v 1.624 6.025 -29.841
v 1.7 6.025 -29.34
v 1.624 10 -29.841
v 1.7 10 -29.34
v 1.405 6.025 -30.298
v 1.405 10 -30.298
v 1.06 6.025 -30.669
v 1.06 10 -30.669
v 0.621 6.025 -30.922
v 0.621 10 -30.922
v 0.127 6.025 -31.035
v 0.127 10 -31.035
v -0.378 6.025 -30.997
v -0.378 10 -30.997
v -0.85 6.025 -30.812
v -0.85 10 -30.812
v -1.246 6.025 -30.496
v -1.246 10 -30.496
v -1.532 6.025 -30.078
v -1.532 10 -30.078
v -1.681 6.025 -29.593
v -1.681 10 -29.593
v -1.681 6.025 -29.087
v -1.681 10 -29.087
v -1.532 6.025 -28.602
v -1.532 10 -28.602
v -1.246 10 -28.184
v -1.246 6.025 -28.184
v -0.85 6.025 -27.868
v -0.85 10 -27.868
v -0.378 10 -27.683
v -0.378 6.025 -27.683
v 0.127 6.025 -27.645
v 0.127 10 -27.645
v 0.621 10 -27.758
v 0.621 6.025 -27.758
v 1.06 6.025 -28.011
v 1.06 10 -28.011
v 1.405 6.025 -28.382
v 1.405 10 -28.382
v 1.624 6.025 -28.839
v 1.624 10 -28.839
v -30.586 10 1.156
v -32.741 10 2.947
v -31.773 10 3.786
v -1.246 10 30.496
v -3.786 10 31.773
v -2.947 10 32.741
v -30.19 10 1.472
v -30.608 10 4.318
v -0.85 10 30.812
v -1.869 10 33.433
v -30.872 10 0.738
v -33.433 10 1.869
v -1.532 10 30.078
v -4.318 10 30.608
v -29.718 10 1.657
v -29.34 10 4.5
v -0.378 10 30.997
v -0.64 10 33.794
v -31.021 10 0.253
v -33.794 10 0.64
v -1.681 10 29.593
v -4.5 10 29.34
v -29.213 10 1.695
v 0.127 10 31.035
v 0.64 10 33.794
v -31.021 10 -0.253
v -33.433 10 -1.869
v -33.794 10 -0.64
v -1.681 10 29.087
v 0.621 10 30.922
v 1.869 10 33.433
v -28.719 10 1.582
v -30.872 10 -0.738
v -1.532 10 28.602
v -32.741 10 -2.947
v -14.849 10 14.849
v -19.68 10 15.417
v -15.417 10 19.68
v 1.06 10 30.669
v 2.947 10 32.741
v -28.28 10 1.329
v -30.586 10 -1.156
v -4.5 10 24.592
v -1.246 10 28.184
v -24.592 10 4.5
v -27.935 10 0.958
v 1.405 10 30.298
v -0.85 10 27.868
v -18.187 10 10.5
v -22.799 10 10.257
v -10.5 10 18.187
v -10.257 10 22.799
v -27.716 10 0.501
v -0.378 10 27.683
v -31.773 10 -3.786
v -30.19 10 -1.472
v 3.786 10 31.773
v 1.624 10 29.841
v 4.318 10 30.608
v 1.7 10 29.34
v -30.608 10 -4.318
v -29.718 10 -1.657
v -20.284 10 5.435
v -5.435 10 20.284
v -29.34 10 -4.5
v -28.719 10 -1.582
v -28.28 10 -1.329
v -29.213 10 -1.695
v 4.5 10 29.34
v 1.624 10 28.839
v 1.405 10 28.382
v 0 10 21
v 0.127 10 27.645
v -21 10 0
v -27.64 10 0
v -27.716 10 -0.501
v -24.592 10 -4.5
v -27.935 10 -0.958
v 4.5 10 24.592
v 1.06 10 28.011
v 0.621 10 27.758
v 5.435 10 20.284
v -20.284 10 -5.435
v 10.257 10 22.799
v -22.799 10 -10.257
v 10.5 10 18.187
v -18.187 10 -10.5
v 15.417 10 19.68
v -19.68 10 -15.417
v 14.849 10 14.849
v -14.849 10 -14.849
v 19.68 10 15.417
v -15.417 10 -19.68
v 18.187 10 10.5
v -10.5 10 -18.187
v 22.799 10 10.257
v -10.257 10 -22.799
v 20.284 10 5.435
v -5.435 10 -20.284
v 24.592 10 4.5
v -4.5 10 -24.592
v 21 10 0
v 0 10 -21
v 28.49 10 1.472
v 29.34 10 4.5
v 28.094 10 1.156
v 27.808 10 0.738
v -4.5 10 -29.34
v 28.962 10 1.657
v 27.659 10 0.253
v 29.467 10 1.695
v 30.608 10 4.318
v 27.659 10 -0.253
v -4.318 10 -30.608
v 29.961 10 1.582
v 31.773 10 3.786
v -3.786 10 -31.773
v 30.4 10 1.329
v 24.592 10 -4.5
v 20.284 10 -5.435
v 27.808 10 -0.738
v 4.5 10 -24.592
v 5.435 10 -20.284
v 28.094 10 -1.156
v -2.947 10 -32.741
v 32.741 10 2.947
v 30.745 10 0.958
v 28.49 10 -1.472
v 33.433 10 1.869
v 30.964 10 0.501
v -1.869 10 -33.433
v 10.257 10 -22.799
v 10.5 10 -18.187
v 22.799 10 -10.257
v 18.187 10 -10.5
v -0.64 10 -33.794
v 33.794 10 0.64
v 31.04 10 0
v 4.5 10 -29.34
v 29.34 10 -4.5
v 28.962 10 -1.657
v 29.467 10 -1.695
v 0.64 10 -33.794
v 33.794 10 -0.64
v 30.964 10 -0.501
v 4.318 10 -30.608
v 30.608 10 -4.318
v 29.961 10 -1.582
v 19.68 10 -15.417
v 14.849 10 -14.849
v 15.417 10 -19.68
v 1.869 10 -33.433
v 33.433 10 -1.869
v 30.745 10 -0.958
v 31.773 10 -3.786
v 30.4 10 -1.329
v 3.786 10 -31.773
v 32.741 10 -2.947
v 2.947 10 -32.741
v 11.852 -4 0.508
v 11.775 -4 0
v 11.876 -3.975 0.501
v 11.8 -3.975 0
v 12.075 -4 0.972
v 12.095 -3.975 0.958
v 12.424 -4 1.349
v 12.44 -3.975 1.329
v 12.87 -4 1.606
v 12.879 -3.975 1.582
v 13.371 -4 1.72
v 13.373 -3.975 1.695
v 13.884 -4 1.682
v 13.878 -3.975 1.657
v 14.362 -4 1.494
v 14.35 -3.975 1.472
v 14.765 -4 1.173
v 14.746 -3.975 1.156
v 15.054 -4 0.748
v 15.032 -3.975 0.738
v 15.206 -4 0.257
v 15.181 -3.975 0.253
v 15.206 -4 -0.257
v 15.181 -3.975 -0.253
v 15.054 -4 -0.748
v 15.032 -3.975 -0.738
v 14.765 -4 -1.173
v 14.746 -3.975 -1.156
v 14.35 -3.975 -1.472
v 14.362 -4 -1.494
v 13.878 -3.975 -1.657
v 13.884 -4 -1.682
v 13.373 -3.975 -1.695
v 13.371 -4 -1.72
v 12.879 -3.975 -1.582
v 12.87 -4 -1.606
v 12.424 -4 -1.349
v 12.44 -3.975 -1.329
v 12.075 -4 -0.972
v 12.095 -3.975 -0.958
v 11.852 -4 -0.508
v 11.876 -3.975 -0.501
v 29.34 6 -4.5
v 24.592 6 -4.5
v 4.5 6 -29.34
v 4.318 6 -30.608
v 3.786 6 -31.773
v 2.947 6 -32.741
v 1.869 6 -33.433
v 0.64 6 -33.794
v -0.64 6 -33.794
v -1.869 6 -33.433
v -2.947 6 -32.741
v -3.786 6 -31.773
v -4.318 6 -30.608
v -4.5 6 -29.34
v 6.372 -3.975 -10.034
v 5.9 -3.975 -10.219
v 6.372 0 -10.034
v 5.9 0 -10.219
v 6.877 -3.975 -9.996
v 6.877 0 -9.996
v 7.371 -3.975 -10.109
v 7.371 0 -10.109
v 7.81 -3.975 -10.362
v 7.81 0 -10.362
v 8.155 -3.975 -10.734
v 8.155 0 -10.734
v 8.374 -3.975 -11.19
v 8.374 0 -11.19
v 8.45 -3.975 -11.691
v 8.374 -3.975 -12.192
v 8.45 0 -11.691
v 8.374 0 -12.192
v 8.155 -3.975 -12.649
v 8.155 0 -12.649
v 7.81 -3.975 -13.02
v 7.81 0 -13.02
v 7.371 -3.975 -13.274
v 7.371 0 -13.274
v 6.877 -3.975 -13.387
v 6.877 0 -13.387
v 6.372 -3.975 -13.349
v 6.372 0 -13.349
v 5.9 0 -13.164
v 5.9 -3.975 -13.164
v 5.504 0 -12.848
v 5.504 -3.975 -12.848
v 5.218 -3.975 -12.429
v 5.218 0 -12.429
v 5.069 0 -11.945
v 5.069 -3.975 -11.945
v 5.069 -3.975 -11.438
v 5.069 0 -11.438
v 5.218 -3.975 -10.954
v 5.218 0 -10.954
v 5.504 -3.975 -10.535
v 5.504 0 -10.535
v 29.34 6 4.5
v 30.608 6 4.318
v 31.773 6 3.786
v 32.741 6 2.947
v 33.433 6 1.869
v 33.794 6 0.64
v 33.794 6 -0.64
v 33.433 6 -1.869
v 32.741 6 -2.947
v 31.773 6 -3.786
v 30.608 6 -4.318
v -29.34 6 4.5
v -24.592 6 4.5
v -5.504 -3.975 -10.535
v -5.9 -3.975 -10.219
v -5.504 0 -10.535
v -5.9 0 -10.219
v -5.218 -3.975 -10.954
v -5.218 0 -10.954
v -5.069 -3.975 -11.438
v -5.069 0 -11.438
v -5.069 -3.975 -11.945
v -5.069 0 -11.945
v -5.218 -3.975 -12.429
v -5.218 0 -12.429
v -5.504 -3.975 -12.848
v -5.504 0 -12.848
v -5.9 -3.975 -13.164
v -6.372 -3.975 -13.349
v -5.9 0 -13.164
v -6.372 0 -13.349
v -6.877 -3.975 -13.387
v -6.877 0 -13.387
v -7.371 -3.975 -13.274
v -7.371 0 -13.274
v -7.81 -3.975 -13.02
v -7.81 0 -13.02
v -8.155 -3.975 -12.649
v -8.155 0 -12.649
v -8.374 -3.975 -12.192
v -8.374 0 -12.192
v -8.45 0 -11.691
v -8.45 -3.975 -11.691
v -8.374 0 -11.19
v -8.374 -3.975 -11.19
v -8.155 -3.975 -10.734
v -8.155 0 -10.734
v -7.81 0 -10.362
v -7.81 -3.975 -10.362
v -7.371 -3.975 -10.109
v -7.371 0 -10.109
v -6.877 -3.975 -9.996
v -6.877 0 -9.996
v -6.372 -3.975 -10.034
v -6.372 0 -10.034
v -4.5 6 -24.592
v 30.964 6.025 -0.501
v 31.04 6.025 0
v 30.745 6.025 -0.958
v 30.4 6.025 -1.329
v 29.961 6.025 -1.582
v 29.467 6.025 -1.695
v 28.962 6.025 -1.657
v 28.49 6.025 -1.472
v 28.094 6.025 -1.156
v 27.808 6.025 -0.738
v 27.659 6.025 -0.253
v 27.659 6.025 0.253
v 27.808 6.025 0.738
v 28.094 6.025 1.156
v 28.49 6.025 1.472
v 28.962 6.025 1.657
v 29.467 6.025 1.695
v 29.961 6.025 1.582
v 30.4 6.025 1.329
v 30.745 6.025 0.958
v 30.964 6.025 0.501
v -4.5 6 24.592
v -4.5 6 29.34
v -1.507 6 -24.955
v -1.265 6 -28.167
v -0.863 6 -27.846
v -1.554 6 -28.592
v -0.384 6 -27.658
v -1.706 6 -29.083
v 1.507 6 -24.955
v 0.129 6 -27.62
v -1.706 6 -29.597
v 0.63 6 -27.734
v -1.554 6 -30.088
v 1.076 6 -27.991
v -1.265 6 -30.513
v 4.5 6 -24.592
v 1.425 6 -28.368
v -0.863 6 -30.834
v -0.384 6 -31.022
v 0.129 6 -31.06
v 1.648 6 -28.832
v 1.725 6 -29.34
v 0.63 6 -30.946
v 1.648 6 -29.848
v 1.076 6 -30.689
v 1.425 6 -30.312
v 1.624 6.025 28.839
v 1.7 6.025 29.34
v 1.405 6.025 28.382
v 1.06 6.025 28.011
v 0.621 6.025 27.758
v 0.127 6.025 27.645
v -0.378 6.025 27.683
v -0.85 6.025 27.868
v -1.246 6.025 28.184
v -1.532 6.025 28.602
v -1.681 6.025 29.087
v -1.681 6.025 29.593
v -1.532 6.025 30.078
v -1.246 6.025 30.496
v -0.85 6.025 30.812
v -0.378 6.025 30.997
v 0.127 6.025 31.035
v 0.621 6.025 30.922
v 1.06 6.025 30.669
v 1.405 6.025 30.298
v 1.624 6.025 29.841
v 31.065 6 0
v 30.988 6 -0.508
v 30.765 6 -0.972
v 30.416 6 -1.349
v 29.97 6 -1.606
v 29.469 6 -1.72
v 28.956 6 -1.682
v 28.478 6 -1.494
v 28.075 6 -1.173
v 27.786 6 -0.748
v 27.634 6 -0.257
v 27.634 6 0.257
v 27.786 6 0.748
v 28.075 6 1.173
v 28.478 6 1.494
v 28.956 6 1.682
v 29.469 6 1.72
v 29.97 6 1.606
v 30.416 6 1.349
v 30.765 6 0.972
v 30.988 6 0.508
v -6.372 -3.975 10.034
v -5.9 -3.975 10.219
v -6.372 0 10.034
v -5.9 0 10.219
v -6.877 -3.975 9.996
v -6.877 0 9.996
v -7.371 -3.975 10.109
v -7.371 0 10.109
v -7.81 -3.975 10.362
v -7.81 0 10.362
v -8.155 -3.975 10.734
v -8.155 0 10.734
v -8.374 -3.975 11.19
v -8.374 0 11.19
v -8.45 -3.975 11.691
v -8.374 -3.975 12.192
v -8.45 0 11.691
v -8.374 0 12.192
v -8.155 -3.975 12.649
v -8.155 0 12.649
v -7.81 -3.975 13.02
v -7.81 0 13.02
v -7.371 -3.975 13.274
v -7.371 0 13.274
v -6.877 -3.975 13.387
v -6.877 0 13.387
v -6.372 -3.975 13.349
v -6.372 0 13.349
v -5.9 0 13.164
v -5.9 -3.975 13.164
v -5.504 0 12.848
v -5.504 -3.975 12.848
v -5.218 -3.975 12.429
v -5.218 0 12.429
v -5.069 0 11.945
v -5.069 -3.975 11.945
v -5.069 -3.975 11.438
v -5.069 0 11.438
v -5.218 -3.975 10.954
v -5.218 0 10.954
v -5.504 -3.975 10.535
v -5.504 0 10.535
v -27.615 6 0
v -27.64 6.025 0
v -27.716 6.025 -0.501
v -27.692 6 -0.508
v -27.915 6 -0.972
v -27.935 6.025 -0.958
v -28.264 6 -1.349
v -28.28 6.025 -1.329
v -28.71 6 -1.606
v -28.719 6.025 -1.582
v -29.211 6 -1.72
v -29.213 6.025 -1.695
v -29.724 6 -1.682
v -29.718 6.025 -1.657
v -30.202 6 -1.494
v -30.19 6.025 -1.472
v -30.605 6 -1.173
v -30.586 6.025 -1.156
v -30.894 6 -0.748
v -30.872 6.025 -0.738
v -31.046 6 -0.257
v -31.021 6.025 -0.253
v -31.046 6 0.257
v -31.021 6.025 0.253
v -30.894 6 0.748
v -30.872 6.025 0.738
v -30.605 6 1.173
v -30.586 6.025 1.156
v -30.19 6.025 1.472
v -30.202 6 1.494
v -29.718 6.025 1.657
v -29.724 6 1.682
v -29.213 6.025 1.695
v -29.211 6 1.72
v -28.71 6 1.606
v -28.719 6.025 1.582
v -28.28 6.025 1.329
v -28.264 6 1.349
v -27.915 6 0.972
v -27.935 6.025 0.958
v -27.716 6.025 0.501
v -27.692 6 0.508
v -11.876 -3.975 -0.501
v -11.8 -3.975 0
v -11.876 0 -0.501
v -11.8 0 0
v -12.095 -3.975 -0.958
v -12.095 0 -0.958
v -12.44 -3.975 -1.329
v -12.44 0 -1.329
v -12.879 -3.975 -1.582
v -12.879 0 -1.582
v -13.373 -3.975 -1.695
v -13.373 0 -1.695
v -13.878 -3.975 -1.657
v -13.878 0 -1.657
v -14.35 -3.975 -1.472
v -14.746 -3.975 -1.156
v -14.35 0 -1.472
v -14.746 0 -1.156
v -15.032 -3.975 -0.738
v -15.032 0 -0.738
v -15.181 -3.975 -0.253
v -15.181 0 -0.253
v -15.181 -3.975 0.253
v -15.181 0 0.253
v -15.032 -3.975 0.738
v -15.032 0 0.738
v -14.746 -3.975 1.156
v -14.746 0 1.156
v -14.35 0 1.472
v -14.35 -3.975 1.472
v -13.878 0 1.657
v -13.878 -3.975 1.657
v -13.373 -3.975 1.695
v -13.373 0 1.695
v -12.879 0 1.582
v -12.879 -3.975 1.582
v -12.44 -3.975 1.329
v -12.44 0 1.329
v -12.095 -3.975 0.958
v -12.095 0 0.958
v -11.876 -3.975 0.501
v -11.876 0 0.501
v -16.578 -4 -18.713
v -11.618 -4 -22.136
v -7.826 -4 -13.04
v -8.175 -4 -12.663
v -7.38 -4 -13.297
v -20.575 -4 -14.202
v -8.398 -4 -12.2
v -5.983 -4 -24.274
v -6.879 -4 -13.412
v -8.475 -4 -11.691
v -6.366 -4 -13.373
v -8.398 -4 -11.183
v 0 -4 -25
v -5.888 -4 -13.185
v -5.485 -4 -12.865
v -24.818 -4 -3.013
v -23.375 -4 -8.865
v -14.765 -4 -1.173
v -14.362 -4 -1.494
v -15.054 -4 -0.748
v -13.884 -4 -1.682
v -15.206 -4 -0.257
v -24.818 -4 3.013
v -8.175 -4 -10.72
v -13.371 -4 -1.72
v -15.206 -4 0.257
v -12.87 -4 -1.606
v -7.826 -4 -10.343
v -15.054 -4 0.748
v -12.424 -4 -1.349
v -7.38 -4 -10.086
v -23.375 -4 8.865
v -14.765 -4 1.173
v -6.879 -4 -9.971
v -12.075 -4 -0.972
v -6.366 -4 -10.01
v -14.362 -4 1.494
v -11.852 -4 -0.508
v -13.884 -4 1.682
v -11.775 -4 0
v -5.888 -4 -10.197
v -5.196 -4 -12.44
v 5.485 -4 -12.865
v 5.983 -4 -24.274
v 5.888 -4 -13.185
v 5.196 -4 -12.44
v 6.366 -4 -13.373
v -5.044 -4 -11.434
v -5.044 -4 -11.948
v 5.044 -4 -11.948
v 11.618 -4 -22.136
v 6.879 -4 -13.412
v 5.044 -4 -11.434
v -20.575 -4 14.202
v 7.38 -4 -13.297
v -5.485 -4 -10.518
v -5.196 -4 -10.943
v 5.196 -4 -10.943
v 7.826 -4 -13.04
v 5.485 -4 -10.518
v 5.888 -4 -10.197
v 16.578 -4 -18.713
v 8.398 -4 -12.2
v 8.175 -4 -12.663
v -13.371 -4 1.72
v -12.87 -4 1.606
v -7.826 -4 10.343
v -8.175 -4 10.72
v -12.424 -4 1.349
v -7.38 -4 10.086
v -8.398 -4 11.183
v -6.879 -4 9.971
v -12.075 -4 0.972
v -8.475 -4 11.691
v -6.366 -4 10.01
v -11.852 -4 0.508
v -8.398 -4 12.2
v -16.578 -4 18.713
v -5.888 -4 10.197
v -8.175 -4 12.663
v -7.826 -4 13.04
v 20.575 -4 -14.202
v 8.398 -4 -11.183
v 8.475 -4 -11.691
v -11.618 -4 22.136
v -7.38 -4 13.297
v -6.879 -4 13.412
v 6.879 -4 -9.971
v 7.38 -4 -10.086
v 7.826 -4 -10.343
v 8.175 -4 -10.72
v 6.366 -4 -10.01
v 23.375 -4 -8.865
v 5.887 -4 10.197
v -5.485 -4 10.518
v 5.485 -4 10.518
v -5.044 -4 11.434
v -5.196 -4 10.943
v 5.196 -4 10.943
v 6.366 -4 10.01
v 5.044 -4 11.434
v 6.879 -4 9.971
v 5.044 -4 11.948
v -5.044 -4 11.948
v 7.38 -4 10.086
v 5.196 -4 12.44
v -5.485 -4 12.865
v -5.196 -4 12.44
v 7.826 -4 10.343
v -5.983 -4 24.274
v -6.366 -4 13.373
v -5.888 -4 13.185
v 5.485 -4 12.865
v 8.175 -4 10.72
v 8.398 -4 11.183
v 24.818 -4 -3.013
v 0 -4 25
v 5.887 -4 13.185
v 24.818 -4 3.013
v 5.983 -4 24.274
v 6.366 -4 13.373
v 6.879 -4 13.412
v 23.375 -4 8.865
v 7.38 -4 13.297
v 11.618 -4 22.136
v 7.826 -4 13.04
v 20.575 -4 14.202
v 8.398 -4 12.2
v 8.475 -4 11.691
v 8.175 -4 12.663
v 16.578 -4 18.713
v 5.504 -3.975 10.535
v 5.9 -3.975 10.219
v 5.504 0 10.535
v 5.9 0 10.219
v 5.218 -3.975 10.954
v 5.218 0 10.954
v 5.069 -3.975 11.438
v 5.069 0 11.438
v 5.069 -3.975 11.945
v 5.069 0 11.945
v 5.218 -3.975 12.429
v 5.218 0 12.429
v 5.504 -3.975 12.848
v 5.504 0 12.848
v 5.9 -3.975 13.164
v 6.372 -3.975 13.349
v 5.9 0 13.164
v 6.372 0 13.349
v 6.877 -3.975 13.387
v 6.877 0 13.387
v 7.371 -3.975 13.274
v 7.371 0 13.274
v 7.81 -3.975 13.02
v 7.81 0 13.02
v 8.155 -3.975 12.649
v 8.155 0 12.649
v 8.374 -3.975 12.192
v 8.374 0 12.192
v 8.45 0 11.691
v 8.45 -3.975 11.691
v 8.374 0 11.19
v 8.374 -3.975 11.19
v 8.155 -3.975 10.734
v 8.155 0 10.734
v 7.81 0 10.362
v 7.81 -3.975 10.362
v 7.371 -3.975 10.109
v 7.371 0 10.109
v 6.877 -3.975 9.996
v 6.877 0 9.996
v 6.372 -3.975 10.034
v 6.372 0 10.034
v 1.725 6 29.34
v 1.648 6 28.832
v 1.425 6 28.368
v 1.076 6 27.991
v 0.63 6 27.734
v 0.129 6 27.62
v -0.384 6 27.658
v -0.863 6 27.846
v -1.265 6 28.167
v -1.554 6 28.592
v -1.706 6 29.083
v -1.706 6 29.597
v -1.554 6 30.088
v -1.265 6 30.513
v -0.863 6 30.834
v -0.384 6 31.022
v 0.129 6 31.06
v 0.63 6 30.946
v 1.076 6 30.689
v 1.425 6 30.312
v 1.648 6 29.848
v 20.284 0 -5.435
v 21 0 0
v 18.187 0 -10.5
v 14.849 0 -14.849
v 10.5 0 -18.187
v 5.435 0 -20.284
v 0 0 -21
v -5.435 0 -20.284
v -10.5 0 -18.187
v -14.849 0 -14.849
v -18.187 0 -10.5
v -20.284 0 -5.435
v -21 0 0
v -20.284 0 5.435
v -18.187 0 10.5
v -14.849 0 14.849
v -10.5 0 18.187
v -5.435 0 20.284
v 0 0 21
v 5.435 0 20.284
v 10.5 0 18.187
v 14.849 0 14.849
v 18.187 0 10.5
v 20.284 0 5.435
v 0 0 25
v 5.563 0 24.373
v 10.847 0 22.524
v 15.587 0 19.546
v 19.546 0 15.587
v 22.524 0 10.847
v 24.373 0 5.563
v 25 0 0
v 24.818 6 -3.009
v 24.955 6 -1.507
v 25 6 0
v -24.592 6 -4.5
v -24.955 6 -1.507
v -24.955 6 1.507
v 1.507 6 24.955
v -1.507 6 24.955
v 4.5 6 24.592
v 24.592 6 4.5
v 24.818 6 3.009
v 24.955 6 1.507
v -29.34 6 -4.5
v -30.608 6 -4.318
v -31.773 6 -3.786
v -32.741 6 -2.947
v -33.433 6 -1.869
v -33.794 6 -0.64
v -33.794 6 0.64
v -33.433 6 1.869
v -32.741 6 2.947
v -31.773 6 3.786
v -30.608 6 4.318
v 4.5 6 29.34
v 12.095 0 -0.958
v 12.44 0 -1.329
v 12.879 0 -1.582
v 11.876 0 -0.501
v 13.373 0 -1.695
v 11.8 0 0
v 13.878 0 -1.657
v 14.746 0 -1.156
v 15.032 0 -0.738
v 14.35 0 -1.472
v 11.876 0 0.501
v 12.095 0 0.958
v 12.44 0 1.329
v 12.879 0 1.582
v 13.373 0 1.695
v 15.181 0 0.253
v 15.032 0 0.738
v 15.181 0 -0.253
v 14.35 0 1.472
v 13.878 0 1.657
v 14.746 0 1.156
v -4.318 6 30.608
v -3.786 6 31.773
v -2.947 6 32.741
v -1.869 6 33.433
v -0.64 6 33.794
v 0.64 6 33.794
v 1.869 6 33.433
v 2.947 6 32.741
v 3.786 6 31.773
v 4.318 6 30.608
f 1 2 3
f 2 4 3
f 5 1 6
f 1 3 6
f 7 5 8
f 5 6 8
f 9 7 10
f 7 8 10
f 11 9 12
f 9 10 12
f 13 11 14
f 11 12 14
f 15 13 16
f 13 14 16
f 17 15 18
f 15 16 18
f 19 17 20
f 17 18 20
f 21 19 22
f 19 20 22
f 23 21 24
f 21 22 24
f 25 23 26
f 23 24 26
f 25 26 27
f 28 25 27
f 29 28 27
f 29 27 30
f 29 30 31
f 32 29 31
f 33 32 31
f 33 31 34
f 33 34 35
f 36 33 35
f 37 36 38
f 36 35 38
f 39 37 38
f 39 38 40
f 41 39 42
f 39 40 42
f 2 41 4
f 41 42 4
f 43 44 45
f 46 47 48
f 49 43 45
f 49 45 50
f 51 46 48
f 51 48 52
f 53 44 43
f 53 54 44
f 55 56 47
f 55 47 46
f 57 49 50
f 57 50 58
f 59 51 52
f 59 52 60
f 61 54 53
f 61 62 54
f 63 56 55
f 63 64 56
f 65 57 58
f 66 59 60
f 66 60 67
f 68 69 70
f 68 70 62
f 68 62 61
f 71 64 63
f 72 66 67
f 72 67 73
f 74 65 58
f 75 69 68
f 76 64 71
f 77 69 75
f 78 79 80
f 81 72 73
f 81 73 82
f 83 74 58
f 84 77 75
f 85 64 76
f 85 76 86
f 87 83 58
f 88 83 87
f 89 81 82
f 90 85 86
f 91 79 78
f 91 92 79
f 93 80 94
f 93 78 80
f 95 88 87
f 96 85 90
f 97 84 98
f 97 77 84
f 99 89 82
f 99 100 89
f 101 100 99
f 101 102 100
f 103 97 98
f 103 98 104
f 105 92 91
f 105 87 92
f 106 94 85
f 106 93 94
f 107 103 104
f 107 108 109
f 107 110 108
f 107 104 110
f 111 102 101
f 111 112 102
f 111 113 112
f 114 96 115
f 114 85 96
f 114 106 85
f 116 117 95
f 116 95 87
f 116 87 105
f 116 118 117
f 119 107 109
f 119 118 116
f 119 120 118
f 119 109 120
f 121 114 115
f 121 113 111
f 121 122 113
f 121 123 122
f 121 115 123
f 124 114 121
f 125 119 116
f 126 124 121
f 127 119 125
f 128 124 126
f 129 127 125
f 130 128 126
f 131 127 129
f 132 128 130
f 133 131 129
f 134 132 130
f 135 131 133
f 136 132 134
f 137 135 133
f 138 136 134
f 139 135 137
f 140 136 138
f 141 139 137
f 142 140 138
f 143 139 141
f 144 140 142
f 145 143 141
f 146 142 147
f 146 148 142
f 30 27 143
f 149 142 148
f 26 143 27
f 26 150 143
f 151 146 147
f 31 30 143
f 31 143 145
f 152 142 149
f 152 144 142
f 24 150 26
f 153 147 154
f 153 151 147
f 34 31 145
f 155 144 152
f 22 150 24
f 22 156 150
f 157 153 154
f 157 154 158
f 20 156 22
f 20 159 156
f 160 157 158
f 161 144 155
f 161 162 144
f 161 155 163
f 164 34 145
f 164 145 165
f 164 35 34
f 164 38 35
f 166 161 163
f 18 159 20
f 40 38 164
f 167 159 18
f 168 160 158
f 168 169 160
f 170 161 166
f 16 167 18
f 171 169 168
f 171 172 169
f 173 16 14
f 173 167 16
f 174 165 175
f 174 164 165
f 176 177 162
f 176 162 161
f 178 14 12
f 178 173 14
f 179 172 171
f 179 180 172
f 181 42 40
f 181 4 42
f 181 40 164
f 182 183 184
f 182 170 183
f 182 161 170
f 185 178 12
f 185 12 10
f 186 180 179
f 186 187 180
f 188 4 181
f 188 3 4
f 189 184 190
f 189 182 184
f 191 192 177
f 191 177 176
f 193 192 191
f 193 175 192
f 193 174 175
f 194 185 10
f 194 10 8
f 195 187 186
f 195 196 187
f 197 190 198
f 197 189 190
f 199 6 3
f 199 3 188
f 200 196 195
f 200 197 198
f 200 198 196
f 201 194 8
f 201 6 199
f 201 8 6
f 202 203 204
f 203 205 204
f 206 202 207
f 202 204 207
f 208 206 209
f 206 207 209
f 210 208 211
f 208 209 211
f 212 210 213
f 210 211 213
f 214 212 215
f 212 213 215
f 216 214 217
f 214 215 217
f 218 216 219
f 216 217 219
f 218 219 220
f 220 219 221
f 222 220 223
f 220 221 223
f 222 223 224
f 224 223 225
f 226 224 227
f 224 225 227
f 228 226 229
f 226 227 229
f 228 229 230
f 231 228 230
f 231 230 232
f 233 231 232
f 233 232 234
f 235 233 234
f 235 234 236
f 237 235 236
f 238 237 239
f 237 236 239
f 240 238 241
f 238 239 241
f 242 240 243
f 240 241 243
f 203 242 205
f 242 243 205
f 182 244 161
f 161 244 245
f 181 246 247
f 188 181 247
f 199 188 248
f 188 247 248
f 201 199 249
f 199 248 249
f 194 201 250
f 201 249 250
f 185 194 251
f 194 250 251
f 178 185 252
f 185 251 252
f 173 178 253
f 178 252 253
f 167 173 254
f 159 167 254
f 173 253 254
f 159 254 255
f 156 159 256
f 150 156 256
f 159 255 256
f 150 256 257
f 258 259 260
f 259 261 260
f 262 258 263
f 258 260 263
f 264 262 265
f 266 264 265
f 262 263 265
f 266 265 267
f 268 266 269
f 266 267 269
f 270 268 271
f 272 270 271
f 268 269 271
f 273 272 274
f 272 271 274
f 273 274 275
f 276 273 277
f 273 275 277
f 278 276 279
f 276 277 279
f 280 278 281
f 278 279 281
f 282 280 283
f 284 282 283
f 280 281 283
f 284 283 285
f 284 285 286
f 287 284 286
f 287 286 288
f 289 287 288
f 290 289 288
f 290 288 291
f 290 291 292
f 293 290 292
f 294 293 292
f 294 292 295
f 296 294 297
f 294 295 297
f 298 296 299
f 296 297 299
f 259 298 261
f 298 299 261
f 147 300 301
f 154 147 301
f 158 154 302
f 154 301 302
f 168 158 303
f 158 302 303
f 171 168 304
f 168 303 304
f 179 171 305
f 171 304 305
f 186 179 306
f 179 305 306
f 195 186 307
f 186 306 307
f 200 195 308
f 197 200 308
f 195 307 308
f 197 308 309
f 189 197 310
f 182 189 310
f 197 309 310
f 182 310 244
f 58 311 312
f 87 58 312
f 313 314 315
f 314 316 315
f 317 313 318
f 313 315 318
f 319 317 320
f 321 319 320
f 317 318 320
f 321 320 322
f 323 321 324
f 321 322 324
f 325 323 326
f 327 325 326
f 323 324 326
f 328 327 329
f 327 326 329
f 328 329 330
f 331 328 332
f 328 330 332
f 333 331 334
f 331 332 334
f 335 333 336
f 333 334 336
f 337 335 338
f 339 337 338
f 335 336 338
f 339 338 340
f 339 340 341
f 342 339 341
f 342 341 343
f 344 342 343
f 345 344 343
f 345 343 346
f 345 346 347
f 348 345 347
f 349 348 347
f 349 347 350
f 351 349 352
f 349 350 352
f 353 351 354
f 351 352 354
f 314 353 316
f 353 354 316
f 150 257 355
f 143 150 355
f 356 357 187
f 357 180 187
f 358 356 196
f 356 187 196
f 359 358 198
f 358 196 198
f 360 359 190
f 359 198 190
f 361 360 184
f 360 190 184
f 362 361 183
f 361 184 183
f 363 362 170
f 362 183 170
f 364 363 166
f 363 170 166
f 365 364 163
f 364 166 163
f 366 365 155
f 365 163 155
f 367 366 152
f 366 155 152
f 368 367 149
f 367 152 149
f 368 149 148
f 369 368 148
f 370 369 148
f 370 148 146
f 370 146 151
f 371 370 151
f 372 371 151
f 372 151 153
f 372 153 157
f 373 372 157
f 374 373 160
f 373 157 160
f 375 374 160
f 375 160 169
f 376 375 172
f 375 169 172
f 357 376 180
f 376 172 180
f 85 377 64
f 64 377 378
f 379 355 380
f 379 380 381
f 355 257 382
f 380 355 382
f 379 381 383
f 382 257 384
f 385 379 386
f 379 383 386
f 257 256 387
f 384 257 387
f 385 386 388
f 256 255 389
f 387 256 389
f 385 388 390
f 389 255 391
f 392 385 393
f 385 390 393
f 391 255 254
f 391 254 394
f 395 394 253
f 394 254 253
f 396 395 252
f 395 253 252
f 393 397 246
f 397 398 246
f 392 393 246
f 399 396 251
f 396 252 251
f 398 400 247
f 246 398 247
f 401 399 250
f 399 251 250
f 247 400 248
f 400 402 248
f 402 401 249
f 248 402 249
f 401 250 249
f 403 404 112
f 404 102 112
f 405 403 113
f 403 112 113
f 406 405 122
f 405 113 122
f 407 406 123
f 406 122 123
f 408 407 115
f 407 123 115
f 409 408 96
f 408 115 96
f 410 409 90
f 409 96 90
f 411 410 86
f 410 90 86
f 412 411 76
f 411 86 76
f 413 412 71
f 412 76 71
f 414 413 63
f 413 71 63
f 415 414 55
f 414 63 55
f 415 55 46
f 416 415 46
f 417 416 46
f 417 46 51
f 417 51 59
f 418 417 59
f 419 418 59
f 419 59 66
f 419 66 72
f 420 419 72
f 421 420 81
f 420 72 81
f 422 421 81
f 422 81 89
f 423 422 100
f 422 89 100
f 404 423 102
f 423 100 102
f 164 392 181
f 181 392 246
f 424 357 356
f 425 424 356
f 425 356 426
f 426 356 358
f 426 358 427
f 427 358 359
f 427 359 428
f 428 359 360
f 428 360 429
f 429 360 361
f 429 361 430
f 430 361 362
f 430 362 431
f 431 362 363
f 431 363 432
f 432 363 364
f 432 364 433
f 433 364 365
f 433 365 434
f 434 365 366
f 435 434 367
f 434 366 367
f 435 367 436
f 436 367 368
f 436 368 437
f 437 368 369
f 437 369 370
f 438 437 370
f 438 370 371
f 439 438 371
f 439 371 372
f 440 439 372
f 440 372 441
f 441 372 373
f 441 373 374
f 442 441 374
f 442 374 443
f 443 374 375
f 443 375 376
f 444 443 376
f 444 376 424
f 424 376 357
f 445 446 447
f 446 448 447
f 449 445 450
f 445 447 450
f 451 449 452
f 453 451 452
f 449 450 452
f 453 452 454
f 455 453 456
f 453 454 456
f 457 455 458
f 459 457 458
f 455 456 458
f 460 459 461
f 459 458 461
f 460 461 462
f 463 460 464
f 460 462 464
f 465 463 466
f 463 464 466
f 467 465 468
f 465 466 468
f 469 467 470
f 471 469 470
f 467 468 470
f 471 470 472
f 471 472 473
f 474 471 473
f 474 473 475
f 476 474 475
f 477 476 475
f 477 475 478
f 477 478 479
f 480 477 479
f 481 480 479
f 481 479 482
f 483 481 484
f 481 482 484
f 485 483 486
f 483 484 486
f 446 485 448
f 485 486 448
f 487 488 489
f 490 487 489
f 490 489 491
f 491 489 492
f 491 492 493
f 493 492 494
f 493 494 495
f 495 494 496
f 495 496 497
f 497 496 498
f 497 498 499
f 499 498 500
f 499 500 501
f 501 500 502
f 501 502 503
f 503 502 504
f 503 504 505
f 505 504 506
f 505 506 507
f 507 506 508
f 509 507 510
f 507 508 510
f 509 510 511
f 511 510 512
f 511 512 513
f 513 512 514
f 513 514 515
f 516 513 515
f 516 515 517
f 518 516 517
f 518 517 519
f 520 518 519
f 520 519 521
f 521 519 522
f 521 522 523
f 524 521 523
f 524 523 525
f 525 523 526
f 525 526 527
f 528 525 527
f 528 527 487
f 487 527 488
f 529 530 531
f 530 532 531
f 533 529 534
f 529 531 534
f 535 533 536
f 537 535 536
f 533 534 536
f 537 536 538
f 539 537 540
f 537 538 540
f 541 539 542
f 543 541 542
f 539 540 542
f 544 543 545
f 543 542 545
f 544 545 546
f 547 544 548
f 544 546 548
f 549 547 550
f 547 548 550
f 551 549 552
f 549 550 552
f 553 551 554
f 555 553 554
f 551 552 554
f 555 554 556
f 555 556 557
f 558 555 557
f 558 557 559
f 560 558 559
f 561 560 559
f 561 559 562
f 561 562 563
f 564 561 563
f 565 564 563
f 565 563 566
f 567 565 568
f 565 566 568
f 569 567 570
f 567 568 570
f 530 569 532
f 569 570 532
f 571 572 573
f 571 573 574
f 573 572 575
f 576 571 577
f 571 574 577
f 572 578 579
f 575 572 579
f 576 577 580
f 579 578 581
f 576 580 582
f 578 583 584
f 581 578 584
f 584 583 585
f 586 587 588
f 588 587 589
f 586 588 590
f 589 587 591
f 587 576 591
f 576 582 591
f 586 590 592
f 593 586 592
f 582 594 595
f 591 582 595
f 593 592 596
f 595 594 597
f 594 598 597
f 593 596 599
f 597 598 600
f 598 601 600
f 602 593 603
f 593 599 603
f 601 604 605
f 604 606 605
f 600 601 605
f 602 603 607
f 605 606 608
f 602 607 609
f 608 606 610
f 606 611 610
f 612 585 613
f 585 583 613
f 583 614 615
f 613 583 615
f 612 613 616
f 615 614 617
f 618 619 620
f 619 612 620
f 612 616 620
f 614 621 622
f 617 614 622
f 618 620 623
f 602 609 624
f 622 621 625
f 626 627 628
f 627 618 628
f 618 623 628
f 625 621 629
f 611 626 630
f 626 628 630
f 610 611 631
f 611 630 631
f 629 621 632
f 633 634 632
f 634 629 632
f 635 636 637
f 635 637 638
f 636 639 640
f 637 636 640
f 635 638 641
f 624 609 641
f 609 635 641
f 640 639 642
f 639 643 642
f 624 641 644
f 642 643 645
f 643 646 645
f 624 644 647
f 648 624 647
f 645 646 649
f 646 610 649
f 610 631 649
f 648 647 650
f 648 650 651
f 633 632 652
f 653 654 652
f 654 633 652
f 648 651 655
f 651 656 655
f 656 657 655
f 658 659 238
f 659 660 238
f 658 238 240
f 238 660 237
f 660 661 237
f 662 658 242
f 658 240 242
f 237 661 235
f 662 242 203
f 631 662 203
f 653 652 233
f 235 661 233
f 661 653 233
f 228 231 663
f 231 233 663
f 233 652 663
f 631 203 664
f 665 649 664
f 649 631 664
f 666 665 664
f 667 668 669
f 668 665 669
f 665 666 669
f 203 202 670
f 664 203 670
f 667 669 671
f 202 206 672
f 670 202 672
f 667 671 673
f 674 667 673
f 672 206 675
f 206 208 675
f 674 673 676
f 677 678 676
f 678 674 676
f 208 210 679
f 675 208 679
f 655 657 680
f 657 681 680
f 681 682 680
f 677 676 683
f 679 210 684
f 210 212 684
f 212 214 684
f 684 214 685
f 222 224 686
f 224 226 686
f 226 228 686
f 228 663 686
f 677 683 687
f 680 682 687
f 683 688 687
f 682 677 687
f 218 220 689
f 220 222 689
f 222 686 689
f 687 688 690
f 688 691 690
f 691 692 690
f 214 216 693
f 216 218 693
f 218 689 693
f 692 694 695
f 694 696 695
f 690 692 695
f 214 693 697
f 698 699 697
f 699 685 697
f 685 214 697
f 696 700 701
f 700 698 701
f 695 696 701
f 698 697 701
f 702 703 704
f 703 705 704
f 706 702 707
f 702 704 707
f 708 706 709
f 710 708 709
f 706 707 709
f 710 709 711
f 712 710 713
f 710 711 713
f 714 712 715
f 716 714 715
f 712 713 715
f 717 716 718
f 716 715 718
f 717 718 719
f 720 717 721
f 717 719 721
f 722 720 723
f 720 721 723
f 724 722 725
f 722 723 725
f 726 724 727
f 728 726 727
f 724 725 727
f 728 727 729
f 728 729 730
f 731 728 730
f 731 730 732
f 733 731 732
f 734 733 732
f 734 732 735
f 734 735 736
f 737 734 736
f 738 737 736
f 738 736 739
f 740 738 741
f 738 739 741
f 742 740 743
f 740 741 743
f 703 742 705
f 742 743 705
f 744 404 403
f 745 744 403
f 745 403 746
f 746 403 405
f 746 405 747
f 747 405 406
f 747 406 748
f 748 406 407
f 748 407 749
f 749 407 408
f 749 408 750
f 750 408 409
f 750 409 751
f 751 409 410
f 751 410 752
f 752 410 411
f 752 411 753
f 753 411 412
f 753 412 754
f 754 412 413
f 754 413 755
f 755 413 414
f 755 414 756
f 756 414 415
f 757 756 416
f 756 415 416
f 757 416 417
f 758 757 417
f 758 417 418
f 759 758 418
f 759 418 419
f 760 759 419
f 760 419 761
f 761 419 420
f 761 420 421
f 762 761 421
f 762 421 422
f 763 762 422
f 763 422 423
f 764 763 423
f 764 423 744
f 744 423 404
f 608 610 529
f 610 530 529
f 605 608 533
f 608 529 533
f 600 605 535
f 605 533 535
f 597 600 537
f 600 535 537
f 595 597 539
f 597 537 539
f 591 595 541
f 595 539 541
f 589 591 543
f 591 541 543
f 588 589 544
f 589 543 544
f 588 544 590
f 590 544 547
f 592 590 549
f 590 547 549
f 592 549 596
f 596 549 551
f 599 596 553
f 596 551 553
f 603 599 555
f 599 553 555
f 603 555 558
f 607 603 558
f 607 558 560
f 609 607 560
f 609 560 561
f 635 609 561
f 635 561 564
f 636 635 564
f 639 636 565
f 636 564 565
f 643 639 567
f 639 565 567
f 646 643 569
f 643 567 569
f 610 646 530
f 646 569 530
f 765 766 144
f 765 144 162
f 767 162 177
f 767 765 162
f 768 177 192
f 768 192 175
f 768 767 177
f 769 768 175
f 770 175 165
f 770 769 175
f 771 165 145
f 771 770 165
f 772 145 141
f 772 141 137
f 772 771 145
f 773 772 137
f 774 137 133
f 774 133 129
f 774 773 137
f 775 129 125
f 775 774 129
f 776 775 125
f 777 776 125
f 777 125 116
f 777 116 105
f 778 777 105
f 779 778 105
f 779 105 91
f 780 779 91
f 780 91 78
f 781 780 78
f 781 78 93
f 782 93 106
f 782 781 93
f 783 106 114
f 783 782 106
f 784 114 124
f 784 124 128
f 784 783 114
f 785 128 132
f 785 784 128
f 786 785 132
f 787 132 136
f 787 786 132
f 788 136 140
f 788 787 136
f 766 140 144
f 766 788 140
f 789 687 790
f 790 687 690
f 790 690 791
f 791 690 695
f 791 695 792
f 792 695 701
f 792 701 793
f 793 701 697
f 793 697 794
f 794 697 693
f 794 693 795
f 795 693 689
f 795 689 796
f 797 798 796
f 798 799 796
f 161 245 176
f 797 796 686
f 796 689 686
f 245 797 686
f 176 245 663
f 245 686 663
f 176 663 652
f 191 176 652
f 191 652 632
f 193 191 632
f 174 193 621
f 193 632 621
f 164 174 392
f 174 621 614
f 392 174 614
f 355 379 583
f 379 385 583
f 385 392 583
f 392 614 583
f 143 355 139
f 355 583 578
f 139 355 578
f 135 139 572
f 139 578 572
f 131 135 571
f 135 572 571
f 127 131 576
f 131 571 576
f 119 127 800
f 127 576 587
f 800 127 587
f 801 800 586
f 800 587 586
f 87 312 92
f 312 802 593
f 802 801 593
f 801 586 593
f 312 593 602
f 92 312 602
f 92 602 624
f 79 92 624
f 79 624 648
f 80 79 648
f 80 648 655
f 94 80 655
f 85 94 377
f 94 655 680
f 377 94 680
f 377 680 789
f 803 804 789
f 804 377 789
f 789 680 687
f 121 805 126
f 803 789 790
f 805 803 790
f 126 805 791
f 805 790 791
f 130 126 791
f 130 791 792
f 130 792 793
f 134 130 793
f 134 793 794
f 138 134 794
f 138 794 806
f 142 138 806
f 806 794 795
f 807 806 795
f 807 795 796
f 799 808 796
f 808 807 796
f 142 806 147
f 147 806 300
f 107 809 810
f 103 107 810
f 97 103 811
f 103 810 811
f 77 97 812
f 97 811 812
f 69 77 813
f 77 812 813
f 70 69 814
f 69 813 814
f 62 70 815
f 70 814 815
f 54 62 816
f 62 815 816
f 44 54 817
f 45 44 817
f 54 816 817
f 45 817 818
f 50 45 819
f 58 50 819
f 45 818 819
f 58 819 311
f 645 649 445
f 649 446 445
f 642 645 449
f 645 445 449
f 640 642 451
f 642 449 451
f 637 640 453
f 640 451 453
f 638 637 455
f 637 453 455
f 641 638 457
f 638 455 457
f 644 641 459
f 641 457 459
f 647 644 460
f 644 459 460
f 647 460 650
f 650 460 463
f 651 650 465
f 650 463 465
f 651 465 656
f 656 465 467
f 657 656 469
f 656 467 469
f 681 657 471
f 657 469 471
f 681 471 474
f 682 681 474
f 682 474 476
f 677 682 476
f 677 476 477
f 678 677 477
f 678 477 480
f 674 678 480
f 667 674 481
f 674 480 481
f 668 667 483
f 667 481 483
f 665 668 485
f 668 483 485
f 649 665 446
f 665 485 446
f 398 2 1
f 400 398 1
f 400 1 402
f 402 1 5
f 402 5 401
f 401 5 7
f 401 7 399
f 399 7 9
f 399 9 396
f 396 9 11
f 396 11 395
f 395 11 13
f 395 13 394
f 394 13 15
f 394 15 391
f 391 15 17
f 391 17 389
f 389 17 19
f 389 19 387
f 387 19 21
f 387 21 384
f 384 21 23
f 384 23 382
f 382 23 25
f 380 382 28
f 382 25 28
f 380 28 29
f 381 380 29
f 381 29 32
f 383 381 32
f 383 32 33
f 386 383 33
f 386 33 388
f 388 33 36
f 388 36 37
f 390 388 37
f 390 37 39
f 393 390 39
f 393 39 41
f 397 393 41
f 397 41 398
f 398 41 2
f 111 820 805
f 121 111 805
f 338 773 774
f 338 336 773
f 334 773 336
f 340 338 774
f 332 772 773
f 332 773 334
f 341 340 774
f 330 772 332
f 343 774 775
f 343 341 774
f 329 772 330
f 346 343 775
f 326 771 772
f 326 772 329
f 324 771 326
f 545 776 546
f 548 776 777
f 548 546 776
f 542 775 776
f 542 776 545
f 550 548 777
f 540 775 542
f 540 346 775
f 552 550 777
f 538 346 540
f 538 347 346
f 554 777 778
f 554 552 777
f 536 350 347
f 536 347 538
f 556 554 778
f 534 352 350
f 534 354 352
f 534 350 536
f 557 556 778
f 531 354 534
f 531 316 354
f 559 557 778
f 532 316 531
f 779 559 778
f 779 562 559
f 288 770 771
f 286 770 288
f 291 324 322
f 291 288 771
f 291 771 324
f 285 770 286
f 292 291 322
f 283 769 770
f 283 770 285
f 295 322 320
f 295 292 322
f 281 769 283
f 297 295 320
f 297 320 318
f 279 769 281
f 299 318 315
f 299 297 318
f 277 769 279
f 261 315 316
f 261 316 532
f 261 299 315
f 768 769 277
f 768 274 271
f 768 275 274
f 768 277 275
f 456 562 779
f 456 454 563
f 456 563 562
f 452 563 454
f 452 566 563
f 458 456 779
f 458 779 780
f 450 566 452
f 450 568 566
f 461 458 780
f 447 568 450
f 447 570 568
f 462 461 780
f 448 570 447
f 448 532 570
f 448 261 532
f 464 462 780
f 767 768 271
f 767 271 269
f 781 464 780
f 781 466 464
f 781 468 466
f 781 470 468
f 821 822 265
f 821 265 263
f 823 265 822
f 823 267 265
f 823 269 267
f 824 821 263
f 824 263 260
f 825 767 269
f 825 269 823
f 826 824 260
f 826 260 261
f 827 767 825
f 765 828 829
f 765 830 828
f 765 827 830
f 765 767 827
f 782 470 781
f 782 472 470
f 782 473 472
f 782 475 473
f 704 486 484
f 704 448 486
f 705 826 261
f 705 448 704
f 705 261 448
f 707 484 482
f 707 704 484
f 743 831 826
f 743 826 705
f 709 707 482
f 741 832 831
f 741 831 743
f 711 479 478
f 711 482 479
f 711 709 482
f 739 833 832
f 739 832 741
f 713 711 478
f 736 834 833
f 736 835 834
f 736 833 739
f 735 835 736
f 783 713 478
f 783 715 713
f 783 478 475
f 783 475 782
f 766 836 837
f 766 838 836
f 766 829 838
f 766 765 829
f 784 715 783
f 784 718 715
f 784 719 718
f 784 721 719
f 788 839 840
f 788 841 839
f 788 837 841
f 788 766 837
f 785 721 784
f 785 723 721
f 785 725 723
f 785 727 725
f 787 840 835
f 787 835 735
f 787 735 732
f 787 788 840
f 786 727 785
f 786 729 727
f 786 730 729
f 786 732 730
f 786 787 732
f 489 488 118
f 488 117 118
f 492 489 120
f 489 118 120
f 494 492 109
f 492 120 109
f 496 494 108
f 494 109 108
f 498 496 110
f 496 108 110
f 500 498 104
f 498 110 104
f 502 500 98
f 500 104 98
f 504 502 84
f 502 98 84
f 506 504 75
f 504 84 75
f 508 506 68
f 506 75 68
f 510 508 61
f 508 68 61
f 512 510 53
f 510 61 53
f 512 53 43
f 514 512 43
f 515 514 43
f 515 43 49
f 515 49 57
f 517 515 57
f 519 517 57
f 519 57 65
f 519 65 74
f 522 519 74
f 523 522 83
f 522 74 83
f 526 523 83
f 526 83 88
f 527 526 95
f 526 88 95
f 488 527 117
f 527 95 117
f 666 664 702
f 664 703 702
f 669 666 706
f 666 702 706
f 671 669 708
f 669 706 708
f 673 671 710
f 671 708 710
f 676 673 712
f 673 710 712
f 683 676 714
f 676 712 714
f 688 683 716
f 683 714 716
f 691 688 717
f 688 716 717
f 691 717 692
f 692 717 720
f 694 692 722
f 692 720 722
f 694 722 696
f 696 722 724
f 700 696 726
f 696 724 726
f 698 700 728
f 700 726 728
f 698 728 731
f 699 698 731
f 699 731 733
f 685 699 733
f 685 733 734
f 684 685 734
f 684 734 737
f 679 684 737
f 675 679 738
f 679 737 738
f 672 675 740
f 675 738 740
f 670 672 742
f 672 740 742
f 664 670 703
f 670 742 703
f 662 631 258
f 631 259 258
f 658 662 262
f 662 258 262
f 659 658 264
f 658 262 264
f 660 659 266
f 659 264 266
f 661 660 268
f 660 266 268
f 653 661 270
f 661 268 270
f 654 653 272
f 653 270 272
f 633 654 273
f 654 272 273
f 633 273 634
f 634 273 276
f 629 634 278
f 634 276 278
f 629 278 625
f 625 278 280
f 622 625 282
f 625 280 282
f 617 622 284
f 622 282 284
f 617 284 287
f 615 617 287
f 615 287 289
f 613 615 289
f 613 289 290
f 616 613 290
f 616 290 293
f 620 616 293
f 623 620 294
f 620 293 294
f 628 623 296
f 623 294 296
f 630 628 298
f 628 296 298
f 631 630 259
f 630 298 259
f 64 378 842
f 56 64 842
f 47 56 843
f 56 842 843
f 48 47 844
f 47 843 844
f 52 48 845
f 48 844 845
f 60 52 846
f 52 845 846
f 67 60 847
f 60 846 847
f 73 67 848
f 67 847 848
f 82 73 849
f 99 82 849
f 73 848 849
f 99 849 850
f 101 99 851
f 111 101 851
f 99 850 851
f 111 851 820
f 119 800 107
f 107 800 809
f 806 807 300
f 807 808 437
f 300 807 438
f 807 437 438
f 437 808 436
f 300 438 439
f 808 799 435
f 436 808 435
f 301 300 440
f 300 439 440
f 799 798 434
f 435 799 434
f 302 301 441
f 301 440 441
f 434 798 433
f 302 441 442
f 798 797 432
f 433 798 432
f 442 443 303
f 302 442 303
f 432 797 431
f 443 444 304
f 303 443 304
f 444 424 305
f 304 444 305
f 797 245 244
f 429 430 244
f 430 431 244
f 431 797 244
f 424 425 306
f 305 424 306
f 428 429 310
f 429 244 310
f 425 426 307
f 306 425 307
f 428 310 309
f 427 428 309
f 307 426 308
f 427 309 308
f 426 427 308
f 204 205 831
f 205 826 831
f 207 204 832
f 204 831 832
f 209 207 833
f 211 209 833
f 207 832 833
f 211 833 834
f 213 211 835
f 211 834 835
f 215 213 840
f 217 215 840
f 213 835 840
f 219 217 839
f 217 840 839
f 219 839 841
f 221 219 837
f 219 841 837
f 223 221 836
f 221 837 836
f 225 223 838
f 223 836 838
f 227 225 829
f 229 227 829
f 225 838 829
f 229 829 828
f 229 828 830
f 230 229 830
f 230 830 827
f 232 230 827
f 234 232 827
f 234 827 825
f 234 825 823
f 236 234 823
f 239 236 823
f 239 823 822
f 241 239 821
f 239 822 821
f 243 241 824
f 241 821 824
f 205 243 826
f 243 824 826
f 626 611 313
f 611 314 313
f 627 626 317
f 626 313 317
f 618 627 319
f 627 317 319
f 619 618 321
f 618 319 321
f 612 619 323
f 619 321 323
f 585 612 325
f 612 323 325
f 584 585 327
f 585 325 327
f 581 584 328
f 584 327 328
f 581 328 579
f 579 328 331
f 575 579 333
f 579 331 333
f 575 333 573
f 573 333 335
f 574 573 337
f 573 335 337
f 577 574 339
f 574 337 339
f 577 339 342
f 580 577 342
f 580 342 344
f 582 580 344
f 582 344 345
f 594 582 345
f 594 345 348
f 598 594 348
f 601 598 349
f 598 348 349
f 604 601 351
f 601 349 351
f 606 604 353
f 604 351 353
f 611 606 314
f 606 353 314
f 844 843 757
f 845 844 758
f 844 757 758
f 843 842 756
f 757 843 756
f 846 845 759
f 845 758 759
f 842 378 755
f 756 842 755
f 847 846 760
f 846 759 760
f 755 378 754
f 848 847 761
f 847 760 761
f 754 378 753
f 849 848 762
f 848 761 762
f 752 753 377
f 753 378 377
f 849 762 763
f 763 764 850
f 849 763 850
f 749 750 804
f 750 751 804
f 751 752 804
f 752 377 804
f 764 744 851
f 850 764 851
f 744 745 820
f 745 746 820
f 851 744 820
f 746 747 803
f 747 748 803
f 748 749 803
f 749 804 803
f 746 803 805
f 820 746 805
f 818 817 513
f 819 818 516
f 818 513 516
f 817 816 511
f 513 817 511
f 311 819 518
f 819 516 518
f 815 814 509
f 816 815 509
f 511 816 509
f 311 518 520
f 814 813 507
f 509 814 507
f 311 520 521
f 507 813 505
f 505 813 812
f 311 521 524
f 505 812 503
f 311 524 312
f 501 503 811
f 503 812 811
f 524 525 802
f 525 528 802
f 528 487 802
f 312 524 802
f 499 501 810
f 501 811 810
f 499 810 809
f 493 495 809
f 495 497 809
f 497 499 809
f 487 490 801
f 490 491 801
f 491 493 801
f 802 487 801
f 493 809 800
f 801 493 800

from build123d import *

# Parameters (mm, degrees)
SKETCH_1_R                   = 25
SKETCH_1_R_2                 = 21
EXTRUDE_1_DEPTH              = 10
EXTRUDE_START                = -4
SKETCH_1_5_R                 = 25
EXTRUDE_2_DEPTH              = 4
EXTRUDE_3_DEPTH              = 4
PATTERN_CIRCULAR_1_COUNT     = 6
HOLE_WIZARD_M3_2_D           = 3.4
HOLE_WIZARD_M3_2_CSINK_D     = 3.45
HOLE_WIZARD_M3_2_CSINK_ANGLE = 90


# Read off the part's stored shape, not the designer's step: M3 间隙孔1
with BuildPart() as part:
    # 草图1 → 拉伸-薄壁1 (new body)
    with BuildSketch(Plane(origin=(0, 0, 0), x_dir=(1, 0, 0), z_dir=(0, 1, 0))):
        Circle(SKETCH_1_R)
        Circle(SKETCH_1_R_2, mode=Mode.SUBTRACT)
    extrude(amount=EXTRUDE_1_DEPTH)

    # 草图1<5> → 凸台-拉伸2 (add)
    with BuildSketch(Plane(origin=(0, 0, 0), x_dir=(1, 0, 0), z_dir=(0, 1, 0)).offset(EXTRUDE_START)):
        with Locations(Location((0, 0, 0), (0, 0, 270))):
            Circle(SKETCH_1_5_R)
    extrude(amount=EXTRUDE_2_DEPTH)

    # 草图3 → 凸台-拉伸3 (add)
    with BuildSketch(Plane(origin=(0, 10, 0), x_dir=(1, 0, 0), z_dir=(0, 1, 0)).offset(EXTRUDE_START)):
        with BuildLine():
            ThreePointArc((-29.34, 4.5), (-33.84, 0), (-29.34, -4.5))
            Line((-29.34, -4.5), (-24.591665255, -4.5))
            ThreePointArc((-24.591665255, -4.5), (-25, 0), (-24.591665255, 4.5))
            Line((-24.591665255, 4.5), (-29.34, 4.5))
        make_face()
        with BuildLine():
            ThreePointArc((24.591665255, 4.5), (24.897707037, 2.259244191), (25, 0))
            ThreePointArc((25, 0), (24.897707037, -2.259244191), (24.591665255, -4.5))
            Line((24.591665255, -4.5), (29.34, -4.5))
            ThreePointArc((29.34, -4.5), (33.84, 0), (29.34, 4.5))
            Line((29.34, 4.5), (24.591665255, 4.5))
        make_face()
        with BuildLine():
            Line((-4.5, 29.34), (-4.5, 24.591665255))
            ThreePointArc((-4.5, 24.591665255), (0, 25), (4.5, 24.591665255))
            Line((4.5, 24.591665255), (4.5, 29.34))
            ThreePointArc((4.5, 29.34), (0, 33.84), (-4.5, 29.34))
        make_face()
        with BuildLine():
            ThreePointArc((4.5, -24.591665255), (0, -25), (-4.5, -24.591665255))
            Line((-4.5, -24.591665255), (-4.5, -29.34))
            ThreePointArc((-4.5, -29.34), (0, -33.84), (4.5, -29.34))
            Line((4.5, -29.34), (4.5, -24.591665255))
        make_face()
    extrude(amount=EXTRUDE_3_DEPTH)

    # M3 间隙孔1 outline → M3 间隙孔1 (revolve, cut)
    with BuildSketch(Plane(origin=(-13.5, 0, 0), x_dir=(1, 0, 0), z_dir=(0, 0, 1))):
        Polygon((1.7, -3.975), (1.7, 0), (0, 0), (0, -4), (1.725, -4), align=None)
    hole_wizard_m3_1 = revolve(axis=Axis((-13.5, 0, 0), (0, 1, 0)), mode=Mode.SUBTRACT)

    # 阵列(圆周)1: M3 间隙孔1 ×6 about axis
    pattern_circular_1_axis = Axis((0, 0, 0), (0, 1, 0))
    for i in range(1, PATTERN_CIRCULAR_1_COUNT):
        add(hole_wizard_m3_1.rotate(pattern_circular_1_axis, i * 360 / PATTERN_CIRCULAR_1_COUNT), mode=Mode.SUBTRACT)

    # M3 间隙孔2 (through all)
    with Locations(Plane(origin=(0, 6, 0), x_dir=(-1, 0, 0), z_dir=(0, -1, 0))):
        with Locations((0, 29.34), (29.34, 0), (0, -29.34), (-29.34, 0)):
            CounterSinkHole(HOLE_WIZARD_M3_2_D / 2, HOLE_WIZARD_M3_2_CSINK_D / 2, counter_sink_angle=HOLE_WIZARD_M3_2_CSINK_ANGLE)


solid = part.part
